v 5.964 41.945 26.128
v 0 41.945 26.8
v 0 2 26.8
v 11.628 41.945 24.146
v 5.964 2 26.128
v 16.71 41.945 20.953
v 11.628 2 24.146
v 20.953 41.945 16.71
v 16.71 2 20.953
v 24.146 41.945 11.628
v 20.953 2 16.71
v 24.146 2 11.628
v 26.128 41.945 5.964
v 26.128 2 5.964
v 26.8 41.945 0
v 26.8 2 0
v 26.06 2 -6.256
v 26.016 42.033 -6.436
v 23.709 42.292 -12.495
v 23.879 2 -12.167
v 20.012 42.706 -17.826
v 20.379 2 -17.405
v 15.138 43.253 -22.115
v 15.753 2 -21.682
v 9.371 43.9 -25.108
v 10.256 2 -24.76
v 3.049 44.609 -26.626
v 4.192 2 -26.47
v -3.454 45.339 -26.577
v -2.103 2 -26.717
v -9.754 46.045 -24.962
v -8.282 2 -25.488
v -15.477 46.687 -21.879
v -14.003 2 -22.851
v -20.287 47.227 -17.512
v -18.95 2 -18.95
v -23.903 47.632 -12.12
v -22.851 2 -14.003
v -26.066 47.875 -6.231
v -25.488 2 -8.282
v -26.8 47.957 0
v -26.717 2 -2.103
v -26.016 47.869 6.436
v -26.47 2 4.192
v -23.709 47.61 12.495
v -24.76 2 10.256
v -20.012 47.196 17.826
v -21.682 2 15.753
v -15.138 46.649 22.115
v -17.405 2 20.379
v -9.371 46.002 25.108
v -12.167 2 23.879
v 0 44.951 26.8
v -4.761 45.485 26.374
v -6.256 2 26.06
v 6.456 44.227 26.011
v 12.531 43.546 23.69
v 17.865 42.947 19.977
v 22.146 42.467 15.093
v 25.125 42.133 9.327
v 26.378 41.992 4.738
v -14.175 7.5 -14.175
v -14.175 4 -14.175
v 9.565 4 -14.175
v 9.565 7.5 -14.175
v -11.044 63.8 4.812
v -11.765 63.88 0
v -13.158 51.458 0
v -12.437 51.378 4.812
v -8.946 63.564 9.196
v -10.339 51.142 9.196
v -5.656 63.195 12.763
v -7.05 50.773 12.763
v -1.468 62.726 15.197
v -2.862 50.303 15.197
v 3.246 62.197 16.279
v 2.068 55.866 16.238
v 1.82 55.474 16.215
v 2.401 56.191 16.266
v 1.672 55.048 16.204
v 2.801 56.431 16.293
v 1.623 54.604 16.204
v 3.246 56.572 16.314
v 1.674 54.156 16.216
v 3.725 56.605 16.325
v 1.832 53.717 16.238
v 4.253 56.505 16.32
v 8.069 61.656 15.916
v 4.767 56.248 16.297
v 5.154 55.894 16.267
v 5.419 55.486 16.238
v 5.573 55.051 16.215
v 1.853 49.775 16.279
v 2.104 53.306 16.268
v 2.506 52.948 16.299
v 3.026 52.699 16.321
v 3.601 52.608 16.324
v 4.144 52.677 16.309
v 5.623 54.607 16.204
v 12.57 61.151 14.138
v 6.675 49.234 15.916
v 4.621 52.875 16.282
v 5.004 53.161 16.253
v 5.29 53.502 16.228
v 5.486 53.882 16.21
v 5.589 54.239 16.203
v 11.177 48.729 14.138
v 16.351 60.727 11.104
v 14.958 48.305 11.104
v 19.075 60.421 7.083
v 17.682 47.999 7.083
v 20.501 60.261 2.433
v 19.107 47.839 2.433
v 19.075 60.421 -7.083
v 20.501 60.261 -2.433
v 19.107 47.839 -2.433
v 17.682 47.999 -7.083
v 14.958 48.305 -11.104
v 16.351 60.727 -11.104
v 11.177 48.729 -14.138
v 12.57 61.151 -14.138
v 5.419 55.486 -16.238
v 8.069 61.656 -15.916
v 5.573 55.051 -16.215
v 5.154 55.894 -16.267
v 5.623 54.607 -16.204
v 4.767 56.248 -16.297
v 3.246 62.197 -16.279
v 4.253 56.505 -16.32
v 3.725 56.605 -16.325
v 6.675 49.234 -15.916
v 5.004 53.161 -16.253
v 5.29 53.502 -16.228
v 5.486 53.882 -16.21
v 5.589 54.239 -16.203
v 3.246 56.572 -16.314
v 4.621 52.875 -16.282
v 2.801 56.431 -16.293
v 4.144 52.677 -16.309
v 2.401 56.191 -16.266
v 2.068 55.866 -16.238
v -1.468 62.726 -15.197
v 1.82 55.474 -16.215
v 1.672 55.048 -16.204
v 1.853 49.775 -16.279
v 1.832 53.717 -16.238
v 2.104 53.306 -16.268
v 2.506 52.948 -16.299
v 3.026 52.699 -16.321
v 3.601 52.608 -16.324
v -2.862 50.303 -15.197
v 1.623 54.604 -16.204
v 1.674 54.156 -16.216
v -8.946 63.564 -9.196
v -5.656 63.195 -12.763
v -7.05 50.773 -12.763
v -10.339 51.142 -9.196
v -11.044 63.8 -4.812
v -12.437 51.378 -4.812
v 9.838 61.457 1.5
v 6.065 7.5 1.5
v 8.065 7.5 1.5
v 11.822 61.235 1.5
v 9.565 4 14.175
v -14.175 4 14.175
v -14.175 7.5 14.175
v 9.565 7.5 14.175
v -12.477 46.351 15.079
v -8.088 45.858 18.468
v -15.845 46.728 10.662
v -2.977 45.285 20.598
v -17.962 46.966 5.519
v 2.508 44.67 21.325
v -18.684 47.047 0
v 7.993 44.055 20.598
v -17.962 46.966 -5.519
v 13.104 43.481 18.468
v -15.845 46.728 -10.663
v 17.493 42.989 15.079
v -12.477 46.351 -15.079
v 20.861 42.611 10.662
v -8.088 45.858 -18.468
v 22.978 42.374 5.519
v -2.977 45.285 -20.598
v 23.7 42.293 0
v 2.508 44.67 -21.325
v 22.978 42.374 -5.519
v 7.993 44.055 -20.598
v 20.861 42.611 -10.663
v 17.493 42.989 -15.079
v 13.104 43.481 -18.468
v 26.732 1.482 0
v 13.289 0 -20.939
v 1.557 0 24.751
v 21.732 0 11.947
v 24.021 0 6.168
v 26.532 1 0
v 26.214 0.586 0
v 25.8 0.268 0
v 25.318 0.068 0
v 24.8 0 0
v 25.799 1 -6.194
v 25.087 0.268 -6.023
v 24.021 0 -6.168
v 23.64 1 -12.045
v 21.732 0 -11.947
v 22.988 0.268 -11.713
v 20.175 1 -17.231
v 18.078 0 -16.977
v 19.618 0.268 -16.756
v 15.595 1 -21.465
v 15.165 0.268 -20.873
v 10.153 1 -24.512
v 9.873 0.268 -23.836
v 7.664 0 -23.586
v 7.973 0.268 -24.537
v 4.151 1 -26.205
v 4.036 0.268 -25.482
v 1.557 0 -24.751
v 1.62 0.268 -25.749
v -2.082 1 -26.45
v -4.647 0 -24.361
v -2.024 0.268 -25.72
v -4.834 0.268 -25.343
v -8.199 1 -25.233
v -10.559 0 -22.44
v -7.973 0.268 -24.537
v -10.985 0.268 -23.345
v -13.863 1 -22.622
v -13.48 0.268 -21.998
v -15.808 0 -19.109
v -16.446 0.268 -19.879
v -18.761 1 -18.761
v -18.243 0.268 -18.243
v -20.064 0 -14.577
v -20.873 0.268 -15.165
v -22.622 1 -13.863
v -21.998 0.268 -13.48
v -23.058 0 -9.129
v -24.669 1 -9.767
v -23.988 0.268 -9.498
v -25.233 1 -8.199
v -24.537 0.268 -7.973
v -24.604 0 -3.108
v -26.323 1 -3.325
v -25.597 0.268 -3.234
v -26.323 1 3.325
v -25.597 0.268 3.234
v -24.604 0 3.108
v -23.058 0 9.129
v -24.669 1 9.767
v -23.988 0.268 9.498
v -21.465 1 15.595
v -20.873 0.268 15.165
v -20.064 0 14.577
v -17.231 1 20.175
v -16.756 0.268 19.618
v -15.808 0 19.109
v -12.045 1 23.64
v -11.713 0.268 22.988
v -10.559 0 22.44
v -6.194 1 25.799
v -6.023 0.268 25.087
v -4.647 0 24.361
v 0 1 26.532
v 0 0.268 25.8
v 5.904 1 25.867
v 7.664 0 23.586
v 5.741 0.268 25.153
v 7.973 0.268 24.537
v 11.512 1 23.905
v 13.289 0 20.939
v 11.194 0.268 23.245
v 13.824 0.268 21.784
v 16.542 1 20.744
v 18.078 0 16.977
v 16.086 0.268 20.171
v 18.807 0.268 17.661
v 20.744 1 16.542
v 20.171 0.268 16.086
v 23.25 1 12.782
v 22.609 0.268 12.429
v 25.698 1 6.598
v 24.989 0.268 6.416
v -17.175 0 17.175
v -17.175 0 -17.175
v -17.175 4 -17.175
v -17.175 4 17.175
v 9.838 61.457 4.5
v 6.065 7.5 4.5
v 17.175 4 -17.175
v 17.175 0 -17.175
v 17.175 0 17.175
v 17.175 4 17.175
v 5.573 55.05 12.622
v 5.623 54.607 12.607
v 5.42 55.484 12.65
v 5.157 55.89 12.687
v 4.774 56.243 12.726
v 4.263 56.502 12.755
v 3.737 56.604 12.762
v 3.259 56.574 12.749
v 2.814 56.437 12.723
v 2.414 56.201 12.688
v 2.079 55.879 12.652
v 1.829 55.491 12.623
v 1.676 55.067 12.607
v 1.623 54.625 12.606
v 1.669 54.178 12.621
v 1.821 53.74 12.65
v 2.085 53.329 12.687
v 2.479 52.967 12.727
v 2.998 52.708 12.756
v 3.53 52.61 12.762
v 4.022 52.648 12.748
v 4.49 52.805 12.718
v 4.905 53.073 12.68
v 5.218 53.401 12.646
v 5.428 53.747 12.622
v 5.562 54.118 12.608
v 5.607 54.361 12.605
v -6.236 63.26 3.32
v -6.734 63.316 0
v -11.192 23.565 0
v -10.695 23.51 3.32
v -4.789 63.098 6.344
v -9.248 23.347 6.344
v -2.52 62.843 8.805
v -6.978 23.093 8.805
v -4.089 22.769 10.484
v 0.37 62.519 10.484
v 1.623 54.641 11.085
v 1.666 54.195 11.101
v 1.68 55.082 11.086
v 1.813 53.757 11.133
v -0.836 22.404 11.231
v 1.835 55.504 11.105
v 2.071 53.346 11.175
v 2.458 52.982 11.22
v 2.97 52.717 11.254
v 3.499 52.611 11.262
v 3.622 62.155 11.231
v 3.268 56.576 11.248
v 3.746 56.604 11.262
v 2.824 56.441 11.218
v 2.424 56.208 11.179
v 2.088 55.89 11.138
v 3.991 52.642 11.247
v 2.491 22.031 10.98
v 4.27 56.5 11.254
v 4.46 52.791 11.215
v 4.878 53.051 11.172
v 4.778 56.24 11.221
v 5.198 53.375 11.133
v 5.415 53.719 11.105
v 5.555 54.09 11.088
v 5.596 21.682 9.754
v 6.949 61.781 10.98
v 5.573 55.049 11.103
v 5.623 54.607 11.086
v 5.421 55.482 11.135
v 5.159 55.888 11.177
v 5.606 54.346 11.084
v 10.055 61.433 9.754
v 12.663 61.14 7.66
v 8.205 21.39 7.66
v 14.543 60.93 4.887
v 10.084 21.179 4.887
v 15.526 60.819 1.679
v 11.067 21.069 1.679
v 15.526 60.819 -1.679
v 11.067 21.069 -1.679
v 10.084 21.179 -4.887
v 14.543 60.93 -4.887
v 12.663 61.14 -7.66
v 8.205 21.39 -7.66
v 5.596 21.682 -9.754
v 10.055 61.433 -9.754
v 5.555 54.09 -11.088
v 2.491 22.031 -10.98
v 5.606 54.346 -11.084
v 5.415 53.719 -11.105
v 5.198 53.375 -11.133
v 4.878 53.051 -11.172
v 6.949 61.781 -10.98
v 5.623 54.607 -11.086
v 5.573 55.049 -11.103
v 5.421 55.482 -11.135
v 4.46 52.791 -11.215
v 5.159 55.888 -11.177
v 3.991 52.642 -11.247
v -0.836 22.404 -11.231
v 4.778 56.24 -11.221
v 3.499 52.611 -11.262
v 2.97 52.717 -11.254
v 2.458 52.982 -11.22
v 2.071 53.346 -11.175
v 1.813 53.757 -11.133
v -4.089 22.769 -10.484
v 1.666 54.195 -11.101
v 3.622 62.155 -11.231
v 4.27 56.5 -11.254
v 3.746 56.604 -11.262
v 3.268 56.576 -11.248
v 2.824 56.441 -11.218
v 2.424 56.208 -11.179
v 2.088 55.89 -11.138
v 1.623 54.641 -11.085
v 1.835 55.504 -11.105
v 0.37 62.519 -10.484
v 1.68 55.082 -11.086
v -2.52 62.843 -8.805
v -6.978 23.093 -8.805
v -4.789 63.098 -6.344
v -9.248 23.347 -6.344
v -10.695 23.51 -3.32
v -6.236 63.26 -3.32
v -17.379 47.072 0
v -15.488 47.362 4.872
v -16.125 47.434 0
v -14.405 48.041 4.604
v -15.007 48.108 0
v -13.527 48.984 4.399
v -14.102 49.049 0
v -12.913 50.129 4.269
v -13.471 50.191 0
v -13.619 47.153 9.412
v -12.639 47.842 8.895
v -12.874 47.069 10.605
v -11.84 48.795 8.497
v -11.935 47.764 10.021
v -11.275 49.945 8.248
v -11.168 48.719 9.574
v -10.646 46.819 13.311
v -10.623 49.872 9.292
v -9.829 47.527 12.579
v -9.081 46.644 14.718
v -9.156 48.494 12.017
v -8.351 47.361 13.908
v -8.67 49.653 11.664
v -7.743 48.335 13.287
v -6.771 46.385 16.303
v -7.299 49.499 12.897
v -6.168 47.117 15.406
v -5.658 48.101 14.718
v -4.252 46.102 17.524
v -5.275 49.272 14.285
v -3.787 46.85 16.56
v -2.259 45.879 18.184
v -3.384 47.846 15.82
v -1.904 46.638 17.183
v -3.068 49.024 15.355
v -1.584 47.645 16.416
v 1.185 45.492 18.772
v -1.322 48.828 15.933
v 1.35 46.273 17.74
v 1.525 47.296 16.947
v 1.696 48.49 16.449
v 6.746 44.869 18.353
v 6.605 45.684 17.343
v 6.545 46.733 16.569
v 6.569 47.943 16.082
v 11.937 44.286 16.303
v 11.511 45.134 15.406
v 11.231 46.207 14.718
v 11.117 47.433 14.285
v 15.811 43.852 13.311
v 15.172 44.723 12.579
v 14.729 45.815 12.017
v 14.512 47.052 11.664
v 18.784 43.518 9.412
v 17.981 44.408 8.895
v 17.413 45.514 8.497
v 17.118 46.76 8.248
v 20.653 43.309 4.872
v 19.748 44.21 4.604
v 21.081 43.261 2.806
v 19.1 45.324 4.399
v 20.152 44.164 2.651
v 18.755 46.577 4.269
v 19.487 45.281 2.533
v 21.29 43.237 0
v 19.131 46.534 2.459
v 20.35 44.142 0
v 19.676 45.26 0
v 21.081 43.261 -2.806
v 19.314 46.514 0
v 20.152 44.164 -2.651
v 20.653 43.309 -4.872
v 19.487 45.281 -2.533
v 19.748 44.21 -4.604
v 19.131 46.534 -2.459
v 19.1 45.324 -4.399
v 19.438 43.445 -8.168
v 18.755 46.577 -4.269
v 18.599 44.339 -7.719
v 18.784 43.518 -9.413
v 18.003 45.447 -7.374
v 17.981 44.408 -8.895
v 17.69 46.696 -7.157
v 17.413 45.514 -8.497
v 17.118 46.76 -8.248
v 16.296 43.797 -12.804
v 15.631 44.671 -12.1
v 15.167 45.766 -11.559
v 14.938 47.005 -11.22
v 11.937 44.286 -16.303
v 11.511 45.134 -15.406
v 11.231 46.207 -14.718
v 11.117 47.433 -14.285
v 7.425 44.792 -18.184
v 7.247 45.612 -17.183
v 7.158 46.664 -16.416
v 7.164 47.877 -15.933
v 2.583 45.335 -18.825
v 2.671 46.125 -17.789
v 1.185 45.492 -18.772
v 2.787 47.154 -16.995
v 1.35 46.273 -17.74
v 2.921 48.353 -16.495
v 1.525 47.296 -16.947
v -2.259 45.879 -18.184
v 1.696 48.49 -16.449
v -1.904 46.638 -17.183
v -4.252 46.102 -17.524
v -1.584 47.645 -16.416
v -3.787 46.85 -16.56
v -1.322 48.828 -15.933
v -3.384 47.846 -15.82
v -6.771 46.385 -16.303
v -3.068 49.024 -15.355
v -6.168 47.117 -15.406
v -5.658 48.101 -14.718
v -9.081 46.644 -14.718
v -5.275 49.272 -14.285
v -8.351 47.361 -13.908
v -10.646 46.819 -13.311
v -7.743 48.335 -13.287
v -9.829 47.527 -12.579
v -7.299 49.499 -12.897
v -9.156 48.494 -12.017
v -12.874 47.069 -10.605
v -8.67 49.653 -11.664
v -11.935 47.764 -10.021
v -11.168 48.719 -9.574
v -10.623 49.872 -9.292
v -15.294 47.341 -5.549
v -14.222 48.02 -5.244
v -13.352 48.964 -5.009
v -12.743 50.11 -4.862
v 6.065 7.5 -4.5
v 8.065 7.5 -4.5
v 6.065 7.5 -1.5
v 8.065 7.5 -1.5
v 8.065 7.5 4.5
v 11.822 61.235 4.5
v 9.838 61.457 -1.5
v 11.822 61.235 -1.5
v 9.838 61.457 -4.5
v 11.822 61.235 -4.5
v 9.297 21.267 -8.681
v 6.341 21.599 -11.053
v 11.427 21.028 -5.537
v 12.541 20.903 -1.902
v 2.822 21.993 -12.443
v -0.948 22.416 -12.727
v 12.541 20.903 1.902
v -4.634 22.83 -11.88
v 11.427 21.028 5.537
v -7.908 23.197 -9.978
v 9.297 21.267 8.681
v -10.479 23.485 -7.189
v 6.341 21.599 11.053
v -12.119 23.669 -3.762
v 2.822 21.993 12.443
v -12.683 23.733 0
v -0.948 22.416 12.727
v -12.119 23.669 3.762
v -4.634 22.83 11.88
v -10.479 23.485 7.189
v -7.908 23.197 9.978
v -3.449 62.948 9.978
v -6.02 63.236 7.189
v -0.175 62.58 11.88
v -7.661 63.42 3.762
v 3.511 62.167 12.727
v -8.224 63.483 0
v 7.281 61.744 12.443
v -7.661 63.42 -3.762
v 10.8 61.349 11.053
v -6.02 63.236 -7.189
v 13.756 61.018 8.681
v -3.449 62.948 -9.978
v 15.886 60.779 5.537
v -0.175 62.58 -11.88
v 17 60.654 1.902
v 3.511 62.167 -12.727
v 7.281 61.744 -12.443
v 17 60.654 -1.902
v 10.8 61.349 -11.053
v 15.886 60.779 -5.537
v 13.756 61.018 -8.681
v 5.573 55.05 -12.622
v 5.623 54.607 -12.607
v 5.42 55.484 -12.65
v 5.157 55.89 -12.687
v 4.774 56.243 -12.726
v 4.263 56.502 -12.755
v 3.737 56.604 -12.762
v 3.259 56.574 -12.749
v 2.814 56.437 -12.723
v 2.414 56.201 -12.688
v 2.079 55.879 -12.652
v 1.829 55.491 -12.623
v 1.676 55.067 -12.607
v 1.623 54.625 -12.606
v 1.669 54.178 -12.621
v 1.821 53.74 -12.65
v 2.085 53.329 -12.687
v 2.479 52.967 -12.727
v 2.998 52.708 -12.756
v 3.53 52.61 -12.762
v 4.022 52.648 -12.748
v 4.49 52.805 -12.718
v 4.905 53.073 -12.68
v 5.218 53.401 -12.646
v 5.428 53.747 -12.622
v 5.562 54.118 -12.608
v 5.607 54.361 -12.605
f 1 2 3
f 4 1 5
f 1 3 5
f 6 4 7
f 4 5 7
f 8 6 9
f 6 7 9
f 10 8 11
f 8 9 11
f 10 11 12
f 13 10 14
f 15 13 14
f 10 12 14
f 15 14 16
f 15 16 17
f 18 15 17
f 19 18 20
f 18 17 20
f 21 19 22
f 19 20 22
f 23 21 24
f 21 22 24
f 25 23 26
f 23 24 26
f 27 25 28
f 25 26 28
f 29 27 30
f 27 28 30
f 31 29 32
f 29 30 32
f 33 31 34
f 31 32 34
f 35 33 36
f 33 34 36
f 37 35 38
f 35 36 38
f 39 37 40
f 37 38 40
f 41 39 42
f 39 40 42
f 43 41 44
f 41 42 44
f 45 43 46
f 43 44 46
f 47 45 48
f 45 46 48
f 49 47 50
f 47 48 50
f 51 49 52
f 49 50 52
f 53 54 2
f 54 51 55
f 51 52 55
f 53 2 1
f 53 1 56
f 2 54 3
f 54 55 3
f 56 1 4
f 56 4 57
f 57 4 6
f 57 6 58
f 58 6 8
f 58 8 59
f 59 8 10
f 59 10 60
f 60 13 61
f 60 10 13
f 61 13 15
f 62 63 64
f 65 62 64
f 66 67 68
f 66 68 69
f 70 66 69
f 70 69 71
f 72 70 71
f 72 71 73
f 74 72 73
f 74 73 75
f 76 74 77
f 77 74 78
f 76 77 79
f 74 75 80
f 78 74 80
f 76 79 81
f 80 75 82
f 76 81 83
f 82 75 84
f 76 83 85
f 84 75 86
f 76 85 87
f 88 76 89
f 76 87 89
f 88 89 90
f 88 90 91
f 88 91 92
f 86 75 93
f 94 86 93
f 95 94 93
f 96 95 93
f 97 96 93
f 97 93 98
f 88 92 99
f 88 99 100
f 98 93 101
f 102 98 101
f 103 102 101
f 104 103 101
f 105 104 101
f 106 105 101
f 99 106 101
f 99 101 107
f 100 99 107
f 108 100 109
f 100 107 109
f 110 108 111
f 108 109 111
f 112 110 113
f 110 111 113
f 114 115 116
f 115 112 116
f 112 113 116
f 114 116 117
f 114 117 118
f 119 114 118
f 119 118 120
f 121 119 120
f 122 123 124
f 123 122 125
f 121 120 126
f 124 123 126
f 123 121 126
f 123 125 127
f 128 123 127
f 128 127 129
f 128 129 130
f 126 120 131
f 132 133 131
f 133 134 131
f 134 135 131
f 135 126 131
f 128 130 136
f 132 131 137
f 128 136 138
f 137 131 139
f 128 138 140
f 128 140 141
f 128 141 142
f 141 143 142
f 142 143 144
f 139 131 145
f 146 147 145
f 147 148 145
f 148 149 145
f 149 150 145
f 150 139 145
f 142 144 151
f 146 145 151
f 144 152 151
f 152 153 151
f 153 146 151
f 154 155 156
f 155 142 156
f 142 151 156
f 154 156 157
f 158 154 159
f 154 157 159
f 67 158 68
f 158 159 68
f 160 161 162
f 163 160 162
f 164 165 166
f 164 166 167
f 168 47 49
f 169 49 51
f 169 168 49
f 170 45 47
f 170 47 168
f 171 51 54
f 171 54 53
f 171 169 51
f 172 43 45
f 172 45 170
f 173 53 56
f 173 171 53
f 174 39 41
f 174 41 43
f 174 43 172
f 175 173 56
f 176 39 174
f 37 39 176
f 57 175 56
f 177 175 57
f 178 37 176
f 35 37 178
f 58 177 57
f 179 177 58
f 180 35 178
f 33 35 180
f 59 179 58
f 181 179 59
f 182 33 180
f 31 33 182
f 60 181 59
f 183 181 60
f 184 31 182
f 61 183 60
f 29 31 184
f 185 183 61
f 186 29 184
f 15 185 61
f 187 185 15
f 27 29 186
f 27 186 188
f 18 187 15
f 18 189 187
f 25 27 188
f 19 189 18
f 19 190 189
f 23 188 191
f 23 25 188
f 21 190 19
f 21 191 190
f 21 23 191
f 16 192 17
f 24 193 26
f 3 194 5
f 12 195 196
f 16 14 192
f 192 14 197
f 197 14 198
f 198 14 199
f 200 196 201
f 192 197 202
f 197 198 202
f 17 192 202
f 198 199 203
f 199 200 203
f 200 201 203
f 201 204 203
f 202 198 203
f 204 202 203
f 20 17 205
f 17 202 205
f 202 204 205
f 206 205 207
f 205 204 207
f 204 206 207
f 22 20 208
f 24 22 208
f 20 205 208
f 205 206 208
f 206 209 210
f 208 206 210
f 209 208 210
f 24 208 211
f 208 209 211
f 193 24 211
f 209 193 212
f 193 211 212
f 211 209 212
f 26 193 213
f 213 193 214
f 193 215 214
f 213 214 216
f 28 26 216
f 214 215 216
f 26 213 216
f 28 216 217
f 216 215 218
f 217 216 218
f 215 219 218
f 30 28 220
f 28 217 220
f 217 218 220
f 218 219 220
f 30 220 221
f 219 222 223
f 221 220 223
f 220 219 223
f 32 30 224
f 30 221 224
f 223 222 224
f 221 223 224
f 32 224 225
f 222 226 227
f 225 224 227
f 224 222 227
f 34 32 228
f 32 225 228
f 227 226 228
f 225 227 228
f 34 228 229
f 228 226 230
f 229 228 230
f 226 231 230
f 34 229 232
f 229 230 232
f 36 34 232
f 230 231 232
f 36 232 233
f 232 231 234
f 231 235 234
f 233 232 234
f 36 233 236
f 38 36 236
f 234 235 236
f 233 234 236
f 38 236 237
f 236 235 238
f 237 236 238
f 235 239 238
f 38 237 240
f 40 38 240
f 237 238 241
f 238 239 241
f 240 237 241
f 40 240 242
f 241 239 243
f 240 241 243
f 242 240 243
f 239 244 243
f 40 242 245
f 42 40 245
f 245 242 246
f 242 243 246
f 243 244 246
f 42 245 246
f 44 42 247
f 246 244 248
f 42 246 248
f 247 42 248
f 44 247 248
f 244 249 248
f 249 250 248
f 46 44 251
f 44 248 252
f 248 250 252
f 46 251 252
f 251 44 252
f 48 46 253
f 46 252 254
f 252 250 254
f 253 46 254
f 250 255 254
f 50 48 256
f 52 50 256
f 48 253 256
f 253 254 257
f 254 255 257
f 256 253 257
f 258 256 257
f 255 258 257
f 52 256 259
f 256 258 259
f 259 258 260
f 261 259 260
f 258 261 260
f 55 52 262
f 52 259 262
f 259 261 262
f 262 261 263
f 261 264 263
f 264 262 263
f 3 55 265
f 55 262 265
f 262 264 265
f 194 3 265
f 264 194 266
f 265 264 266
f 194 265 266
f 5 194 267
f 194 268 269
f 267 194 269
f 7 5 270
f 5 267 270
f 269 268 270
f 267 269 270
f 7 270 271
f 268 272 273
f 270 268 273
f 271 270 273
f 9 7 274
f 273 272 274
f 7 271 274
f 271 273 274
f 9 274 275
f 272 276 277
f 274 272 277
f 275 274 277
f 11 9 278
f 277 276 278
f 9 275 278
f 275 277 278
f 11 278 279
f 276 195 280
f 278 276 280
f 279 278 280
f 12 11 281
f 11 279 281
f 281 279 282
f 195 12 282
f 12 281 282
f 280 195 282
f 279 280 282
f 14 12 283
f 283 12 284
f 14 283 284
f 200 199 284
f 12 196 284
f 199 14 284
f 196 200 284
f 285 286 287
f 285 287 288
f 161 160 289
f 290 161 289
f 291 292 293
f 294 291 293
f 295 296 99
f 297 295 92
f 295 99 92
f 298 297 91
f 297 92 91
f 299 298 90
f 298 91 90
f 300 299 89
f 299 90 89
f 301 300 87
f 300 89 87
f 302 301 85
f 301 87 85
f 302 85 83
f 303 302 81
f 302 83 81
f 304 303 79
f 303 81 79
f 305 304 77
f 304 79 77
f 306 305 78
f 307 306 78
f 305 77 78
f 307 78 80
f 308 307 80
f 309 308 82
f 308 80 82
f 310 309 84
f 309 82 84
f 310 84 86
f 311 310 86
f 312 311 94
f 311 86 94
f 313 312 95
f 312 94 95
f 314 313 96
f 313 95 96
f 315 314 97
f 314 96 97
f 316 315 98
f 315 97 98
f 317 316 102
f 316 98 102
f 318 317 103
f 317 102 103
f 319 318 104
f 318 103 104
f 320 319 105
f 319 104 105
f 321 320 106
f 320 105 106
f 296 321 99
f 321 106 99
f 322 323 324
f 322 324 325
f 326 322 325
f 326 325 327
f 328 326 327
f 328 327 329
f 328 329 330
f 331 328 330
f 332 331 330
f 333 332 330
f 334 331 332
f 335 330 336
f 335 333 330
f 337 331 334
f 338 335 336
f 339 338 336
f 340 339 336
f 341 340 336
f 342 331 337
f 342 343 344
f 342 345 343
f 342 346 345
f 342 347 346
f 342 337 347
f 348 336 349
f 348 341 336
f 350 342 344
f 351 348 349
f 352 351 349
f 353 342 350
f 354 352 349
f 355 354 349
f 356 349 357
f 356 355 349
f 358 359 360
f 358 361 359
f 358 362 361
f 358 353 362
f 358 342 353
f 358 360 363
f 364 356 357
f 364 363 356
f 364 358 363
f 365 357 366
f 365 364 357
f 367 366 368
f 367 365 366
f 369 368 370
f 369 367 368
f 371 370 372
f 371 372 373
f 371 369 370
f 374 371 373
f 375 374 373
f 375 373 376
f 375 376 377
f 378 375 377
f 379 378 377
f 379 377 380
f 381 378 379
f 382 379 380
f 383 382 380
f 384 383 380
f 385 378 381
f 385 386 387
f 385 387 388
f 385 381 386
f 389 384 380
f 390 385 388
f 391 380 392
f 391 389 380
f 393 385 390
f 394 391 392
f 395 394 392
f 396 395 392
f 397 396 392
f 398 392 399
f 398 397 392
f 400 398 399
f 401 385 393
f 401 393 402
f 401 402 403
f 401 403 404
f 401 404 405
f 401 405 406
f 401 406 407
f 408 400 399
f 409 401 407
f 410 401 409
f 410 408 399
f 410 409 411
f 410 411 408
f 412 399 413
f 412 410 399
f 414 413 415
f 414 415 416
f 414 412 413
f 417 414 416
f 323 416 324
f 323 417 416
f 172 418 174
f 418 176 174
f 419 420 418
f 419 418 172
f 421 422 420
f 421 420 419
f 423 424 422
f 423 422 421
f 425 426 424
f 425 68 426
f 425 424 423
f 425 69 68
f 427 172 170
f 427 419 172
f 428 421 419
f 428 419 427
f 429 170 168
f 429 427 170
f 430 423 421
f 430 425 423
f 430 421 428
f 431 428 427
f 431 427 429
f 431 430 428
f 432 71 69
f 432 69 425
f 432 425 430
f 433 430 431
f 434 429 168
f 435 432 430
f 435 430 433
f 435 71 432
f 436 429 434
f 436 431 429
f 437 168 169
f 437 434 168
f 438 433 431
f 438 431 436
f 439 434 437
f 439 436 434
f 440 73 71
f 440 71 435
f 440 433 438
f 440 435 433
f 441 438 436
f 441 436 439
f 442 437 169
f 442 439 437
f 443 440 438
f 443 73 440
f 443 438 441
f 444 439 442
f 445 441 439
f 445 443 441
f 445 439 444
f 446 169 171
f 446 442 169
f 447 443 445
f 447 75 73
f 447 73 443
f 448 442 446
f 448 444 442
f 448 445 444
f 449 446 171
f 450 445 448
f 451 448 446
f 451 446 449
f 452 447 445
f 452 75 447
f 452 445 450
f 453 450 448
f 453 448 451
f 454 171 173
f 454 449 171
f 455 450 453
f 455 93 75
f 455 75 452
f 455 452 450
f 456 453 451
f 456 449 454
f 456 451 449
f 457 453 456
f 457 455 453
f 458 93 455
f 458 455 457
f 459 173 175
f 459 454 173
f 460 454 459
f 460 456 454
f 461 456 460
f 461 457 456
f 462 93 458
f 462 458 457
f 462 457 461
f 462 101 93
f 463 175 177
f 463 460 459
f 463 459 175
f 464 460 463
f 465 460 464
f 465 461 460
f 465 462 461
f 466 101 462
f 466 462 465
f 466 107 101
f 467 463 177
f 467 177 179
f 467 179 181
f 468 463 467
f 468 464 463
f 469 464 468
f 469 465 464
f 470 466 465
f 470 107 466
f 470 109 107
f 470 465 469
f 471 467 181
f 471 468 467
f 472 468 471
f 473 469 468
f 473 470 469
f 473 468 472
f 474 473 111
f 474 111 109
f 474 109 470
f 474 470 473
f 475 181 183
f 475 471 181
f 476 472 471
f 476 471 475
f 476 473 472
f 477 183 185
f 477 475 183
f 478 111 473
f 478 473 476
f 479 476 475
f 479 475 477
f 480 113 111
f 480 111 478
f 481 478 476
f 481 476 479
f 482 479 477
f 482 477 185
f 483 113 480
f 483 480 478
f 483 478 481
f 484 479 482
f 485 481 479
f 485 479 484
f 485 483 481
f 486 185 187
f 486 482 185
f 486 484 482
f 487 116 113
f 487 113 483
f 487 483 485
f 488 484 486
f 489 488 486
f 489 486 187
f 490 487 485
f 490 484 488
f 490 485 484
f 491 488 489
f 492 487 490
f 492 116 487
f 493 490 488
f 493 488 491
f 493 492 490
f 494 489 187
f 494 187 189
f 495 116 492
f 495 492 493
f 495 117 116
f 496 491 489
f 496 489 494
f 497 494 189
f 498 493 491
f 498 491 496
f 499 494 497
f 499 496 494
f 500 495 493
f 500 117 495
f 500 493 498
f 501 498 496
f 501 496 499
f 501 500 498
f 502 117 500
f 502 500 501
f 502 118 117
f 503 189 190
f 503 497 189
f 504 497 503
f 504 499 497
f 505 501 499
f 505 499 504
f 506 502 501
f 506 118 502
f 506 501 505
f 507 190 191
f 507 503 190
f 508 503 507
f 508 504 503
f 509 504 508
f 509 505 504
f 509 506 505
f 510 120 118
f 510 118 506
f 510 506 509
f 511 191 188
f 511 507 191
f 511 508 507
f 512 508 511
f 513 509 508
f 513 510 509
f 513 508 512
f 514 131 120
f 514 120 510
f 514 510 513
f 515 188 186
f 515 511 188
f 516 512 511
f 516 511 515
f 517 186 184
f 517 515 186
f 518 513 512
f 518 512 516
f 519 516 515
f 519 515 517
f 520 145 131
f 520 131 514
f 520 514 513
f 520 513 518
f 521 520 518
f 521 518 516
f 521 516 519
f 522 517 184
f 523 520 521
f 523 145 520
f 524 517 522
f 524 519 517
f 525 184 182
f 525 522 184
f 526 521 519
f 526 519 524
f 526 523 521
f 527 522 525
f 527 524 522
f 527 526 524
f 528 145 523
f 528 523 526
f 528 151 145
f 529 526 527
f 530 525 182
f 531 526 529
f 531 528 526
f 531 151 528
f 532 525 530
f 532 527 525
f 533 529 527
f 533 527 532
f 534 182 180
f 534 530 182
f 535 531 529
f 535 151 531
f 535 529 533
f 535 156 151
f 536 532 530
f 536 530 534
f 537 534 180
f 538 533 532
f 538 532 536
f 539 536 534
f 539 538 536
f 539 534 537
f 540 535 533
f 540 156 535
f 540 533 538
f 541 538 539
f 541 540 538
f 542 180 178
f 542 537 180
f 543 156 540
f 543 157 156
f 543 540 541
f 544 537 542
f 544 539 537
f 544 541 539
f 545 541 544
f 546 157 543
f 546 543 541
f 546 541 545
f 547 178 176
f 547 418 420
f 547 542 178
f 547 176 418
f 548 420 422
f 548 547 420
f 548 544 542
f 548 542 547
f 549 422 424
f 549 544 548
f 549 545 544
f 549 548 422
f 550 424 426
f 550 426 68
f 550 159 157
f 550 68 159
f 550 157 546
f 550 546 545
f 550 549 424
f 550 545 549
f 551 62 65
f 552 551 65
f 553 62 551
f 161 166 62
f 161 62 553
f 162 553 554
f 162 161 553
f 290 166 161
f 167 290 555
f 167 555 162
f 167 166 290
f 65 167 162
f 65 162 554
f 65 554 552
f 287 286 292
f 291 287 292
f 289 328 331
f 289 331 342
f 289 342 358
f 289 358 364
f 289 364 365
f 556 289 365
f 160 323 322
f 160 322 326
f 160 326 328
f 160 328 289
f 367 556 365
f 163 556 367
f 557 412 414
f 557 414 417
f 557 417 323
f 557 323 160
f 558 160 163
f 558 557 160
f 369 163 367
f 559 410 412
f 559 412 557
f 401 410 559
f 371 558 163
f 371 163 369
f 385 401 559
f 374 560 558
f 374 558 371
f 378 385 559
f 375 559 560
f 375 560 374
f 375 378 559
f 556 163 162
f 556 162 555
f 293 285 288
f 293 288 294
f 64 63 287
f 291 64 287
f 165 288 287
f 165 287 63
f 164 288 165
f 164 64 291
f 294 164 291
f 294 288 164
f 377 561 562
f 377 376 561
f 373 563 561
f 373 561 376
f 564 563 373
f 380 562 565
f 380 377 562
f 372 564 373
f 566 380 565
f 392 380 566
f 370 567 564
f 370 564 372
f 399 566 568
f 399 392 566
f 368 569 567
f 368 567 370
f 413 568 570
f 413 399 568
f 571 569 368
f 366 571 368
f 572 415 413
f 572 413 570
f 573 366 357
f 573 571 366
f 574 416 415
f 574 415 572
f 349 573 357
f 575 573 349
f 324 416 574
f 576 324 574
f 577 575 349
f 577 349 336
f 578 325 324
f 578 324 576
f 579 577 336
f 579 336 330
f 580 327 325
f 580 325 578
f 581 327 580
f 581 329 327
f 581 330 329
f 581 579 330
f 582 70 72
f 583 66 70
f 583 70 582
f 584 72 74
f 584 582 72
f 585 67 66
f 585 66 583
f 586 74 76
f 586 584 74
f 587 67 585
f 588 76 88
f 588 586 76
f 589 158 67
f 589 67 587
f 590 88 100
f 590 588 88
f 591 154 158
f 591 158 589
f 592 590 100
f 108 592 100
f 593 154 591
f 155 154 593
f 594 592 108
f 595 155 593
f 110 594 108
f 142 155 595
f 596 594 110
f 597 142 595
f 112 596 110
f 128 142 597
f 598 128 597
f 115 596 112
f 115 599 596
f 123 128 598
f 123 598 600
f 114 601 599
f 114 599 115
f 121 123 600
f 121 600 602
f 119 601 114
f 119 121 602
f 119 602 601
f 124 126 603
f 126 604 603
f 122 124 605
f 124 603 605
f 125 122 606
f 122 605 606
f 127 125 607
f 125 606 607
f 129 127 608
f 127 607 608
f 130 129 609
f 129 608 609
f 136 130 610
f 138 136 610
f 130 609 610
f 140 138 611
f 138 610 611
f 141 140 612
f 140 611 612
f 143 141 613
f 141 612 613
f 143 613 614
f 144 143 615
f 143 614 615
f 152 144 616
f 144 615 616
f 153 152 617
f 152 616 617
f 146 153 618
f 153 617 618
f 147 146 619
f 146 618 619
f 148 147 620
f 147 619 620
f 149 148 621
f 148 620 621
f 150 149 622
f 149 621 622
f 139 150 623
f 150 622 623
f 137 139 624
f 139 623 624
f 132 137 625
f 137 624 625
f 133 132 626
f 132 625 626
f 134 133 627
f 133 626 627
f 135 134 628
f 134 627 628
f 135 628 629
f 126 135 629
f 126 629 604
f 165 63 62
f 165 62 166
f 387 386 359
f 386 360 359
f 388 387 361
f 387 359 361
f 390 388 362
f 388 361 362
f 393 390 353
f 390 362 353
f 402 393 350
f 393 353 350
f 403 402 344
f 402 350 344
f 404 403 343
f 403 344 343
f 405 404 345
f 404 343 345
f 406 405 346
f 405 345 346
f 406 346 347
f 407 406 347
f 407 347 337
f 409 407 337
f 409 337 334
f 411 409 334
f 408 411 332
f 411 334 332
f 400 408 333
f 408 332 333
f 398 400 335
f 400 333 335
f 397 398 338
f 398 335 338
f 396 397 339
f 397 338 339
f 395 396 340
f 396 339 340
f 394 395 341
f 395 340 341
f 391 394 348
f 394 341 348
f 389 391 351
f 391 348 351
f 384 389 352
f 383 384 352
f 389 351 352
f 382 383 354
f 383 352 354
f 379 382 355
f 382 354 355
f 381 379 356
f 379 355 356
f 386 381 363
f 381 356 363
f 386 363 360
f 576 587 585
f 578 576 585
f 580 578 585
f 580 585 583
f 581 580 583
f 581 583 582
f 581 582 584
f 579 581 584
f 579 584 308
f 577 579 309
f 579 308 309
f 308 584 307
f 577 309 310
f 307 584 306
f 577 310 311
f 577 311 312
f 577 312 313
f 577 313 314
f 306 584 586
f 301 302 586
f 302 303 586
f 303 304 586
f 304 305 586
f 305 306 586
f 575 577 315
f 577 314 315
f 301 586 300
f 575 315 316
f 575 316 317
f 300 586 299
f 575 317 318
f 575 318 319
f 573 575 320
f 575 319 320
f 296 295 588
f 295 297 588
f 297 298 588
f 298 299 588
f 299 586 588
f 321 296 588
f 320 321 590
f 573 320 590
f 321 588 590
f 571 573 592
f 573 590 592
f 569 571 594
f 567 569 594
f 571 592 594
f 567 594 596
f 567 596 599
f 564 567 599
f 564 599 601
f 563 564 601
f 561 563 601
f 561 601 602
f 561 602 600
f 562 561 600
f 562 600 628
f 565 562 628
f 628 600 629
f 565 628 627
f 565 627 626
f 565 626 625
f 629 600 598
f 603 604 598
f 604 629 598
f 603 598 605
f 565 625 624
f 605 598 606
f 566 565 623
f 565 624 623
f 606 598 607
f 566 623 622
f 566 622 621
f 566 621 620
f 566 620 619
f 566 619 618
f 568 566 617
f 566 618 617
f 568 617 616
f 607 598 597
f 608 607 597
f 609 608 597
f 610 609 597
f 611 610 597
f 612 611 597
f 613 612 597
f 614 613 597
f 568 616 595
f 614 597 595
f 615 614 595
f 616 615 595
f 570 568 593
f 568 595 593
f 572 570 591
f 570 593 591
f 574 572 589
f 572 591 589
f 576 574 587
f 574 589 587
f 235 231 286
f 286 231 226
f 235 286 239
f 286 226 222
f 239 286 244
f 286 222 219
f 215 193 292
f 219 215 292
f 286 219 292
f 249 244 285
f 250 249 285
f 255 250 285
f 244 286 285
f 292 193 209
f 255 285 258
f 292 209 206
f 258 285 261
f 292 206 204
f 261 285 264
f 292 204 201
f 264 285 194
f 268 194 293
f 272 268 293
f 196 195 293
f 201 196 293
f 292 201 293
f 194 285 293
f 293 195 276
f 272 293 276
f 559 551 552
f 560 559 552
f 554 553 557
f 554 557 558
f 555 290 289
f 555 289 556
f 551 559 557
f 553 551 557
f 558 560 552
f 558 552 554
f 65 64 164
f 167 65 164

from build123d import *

# Parameters (mm, degrees)
SKETCH1_R                  = 26.8
MAIN_BODY_EXTRUDE_DEPTH    = 41.945
ANGLED_EXTRUDE_OUTLINE_R   = 26.8
ANGLED_EXTRUDE_DEPTH       = 6.012203303
ANGLED_START               = 44.670962752
ANGLED_EXTRUDE_2_OUTLINE_W = 56
ANGLED_EXTRUDE_2_OUTLINE_H = 56
ANGLED_EXTRUDE_2_DEPTH     = 7.329037248
SKETCH8_R                  = 16.325
ATTACHMENT_EXTRUDE_DEPTH   = 22.5
SKETCH11_R                 = 12.7625
SKETCH11_R_2               = 11.2625
TUBING_HOLE_DEPTH          = 45
SKETCH13_R                 = 2
BOLT_HOLE_DEPTH            = 25
SKETCH14_W                 = 34.35
SKETCH14_H                 = 34.35
CUT_EXTRUDE3_DEPTH         = 4
CUT_EXTRUDE4_DEPTH         = 2
SKETCH16_W                 = 23.74
SKETCH16_H                 = 28.35
CUT_EXTRUDE5_DEPTH         = 3.5
CUT_EXTRUDE12_REACH        = 74.294
SKETCH36_W                 = 2
SKETCH36_H                 = 3
FILLET3_R                  = 5
SKETCH32_R                 = 17.343535691
CUT_EXTRUDE10_DEPTH        = 5


with BuildPart() as part:
    # Sketch1 → Main Body Extrude (new body)
    with BuildSketch(Plane(origin=(0, 0, 0), x_dir=(1, 0, 0), z_dir=(0, 1, 0))):
        with Locations(Location((0, 0, 0), (0, 0, 270))):
            Circle(SKETCH1_R)
    extrude(amount=MAIN_BODY_EXTRUDE_DEPTH)

    # Angled Extrude: read off the stored shape, not the designer's step
    # Angled Extrude outline → Angled Extrude (add)
    with BuildSketch(Plane(origin=(0, 41.945, 0), x_dir=(1, 0, 0), z_dir=(0, 1, 0))):
        Circle(ANGLED_EXTRUDE_OUTLINE_R)
    extrude(amount=ANGLED_EXTRUDE_DEPTH)

    # Angled Extrude 2 outline → Angled Extrude 2 (cut)
    with BuildSketch(Plane(origin=(0, 0, 0), x_dir=(0.9937679191605965, -0.11146893220632507, 0), z_dir=(0.11146893220632506, 0.9937679191605965, 0)).offset(ANGLED_START)):
        with Locations((-5, 0)):
            Rectangle(ANGLED_EXTRUDE_2_OUTLINE_W, ANGLED_EXTRUDE_2_OUTLINE_H)
    extrude(amount=ANGLED_EXTRUDE_2_DEPTH, mode=Mode.SUBTRACT)

    # Sketch8 → Attachment Extrude (add)
    with BuildSketch(Plane(origin=(4.979424519, 44.392569701, 0), x_dir=(0.9937679191605964, -0.11146893220632542, 0), z_dir=(0.11146893220632542, 0.9937679191605964, 0))):
        with Locations(Location((-2.486871931, 0, 0), (0, 0, 180))):
            Circle(SKETCH8_R)
    extrude(amount=ATTACHMENT_EXTRUDE_DEPTH)

    # Sketch11 → Tubing Hole (cut)
    with BuildSketch(Plane(origin=(7.487475493, 66.752347882, 0), x_dir=(0.9937679191605964, -0.11146893220632542, 0), z_dir=(0.11146893220632542, 0.9937679191605964, 0))):
        with Locations(Location((-2.486871931, 0, 0), (0, 0, 180))):
            Circle(SKETCH11_R)
        with Locations(Location((-2.486871931, 0, 0), (0, 0, 180))):
            Circle(SKETCH11_R_2, mode=Mode.SUBTRACT)
    extrude(amount=-TUBING_HOLE_DEPTH, mode=Mode.SUBTRACT)

    # Sketch13 → Bolt Hole (cut, symmetric)
    with BuildSketch(Plane.XY):
        with Locations((3.622740297, 54.607457852)):
            Circle(SKETCH13_R)
    extrude(amount=BOLT_HOLE_DEPTH, both=True, mode=Mode.SUBTRACT)

    # Sketch14 → Cut-Extrude3 (cut)
    with BuildSketch(Plane.XZ):
        Rectangle(SKETCH14_W, SKETCH14_H)
    extrude(amount=-CUT_EXTRUDE3_DEPTH, mode=Mode.SUBTRACT)

    # Sketch15 → Cut-Extrude4 (cut)
    with BuildSketch(Plane.XZ.offset(-4)):
        with BuildLine():
            ThreePointArc((-6.675, -12.175), (-5.175, -13.675), (-3.675, -12.175))
            Line((-3.675, -12.175), (-6.675, -12.175))
        make_face()
        with BuildLine():
            Line((-6.675, -12.175), (-3.675, -12.175))
            ThreePointArc((-3.675, -12.175), (-5.175, -10.675), (-6.675, -12.175))
        make_face()
        with BuildLine():
            ThreePointArc((-10.675, 0), (-11.114339828, 1.060660172), (-12.175, 1.5))
            Line((-12.175, 1.5), (-12.175, -1.5))
            ThreePointArc((-12.175, -1.5), (-11.114339828, -1.060660172), (-10.675, 0))
        make_face()
        with BuildLine():
            Line((-12.175, -1.5), (-12.175, 1.5))
            ThreePointArc((-12.175, 1.5), (-13.675, 0), (-12.175, -1.5))
        make_face()
        with BuildLine():
            ThreePointArc((-6.675, 12.175), (-5.175, 10.675), (-3.675, 12.175))
            Line((-3.675, 12.175), (-6.675, 12.175))
        make_face()
        with BuildLine():
            Line((-6.675, 12.175), (-3.675, 12.175))
            ThreePointArc((-3.675, 12.175), (-5.175, 13.675), (-6.675, 12.175))
        make_face()
    extrude(amount=-CUT_EXTRUDE4_DEPTH, mode=Mode.SUBTRACT)

    # Sketch16 → Cut-Extrude5 (cut)
    with BuildSketch(Plane.XZ.offset(-4)):
        with Locations((-2.305, 0)):
            Rectangle(SKETCH16_W, SKETCH16_H)
    extrude(amount=-CUT_EXTRUDE5_DEPTH, mode=Mode.SUBTRACT)

    # Fillet1: read off the stored shape, not the designer's step
    # Fillet1 outline → Fillet1 (revolve, cut)
    with BuildSketch(Plane.XY):
        with BuildLine():
            ThreePointArc((26.8, 2), (26.214213562, 0.585786438), (24.8, 0))
            Line((24.8, 0), (26.8, 0))
            Line((26.8, 0), (26.8, 2))
        make_face()
    revolve(axis=Axis((0, 0, 0), (0, 1, 0)), mode=Mode.SUBTRACT)

    # Cut-Extrude12: up to this plane
    cut_extrude12_end = Plane(origin=(5.016101949, 67.029556841, 0), z_dir=(0.11146893220632542, 0.9937679191605964, 0))
    # Sketch36 → Cut-Extrude12 (cut, up to the surface)
    with BuildSketch(Plane.XZ.offset(-7.5), mode=Mode.PRIVATE) as cut_extrude12_sk1:
        with Locations((7.065, 3)):
            Rectangle(SKETCH36_W, SKETCH36_H)
    cut_extrude12_tool1 = split(extrude(cut_extrude12_sk1.sketch, amount=CUT_EXTRUDE12_REACH, dir=(0.069756473744, 0.99756405026, 0), mode=Mode.PRIVATE), bisect_by=cut_extrude12_end, keep=Keep.BOTH, mode=Mode.PRIVATE)
    add(cut_extrude12_tool1.solids().sort_by_distance((7.065, 7.5, 3))[0], mode=Mode.SUBTRACT)
    # Sketch36 → Cut-Extrude12 (cut, up to the surface)
    with BuildSketch(Plane.XZ.offset(-7.5), mode=Mode.PRIVATE) as cut_extrude12_sk2:
        with Locations((7.065, -3)):
            Rectangle(SKETCH36_W, SKETCH36_H)
    cut_extrude12_tool2 = split(extrude(cut_extrude12_sk2.sketch, amount=CUT_EXTRUDE12_REACH, dir=(0.069756473744, 0.99756405026, 0), mode=Mode.PRIVATE), bisect_by=cut_extrude12_end, keep=Keep.BOTH, mode=Mode.PRIVATE)
    add(cut_extrude12_tool2.solids().sort_by_distance((7.065, 7.5, -3))[0], mode=Mode.SUBTRACT)

    # Fillet3
    fillet3_edges = [part.edges().sort_by_distance(p)[0] for p in [
        (18.731312255, 42.850048342, 0),
    ]]
    fillet(fillet3_edges, radius=FILLET3_R)

    # Sketch32 → Cut-Extrude10 (cut)
    with BuildSketch(Plane(origin=(7.487475493, 66.752347882, 0), x_dir=(0.9937679191605965, -0.11146893220632544, 0), z_dir=(0.11146893220632544, 0.9937679191605965, 0))):
        with Locations((-2.464764356, 0)):
            Circle(SKETCH32_R)
    extrude(amount=-CUT_EXTRUDE10_DEPTH, mode=Mode.SUBTRACT)


solid = part.part
